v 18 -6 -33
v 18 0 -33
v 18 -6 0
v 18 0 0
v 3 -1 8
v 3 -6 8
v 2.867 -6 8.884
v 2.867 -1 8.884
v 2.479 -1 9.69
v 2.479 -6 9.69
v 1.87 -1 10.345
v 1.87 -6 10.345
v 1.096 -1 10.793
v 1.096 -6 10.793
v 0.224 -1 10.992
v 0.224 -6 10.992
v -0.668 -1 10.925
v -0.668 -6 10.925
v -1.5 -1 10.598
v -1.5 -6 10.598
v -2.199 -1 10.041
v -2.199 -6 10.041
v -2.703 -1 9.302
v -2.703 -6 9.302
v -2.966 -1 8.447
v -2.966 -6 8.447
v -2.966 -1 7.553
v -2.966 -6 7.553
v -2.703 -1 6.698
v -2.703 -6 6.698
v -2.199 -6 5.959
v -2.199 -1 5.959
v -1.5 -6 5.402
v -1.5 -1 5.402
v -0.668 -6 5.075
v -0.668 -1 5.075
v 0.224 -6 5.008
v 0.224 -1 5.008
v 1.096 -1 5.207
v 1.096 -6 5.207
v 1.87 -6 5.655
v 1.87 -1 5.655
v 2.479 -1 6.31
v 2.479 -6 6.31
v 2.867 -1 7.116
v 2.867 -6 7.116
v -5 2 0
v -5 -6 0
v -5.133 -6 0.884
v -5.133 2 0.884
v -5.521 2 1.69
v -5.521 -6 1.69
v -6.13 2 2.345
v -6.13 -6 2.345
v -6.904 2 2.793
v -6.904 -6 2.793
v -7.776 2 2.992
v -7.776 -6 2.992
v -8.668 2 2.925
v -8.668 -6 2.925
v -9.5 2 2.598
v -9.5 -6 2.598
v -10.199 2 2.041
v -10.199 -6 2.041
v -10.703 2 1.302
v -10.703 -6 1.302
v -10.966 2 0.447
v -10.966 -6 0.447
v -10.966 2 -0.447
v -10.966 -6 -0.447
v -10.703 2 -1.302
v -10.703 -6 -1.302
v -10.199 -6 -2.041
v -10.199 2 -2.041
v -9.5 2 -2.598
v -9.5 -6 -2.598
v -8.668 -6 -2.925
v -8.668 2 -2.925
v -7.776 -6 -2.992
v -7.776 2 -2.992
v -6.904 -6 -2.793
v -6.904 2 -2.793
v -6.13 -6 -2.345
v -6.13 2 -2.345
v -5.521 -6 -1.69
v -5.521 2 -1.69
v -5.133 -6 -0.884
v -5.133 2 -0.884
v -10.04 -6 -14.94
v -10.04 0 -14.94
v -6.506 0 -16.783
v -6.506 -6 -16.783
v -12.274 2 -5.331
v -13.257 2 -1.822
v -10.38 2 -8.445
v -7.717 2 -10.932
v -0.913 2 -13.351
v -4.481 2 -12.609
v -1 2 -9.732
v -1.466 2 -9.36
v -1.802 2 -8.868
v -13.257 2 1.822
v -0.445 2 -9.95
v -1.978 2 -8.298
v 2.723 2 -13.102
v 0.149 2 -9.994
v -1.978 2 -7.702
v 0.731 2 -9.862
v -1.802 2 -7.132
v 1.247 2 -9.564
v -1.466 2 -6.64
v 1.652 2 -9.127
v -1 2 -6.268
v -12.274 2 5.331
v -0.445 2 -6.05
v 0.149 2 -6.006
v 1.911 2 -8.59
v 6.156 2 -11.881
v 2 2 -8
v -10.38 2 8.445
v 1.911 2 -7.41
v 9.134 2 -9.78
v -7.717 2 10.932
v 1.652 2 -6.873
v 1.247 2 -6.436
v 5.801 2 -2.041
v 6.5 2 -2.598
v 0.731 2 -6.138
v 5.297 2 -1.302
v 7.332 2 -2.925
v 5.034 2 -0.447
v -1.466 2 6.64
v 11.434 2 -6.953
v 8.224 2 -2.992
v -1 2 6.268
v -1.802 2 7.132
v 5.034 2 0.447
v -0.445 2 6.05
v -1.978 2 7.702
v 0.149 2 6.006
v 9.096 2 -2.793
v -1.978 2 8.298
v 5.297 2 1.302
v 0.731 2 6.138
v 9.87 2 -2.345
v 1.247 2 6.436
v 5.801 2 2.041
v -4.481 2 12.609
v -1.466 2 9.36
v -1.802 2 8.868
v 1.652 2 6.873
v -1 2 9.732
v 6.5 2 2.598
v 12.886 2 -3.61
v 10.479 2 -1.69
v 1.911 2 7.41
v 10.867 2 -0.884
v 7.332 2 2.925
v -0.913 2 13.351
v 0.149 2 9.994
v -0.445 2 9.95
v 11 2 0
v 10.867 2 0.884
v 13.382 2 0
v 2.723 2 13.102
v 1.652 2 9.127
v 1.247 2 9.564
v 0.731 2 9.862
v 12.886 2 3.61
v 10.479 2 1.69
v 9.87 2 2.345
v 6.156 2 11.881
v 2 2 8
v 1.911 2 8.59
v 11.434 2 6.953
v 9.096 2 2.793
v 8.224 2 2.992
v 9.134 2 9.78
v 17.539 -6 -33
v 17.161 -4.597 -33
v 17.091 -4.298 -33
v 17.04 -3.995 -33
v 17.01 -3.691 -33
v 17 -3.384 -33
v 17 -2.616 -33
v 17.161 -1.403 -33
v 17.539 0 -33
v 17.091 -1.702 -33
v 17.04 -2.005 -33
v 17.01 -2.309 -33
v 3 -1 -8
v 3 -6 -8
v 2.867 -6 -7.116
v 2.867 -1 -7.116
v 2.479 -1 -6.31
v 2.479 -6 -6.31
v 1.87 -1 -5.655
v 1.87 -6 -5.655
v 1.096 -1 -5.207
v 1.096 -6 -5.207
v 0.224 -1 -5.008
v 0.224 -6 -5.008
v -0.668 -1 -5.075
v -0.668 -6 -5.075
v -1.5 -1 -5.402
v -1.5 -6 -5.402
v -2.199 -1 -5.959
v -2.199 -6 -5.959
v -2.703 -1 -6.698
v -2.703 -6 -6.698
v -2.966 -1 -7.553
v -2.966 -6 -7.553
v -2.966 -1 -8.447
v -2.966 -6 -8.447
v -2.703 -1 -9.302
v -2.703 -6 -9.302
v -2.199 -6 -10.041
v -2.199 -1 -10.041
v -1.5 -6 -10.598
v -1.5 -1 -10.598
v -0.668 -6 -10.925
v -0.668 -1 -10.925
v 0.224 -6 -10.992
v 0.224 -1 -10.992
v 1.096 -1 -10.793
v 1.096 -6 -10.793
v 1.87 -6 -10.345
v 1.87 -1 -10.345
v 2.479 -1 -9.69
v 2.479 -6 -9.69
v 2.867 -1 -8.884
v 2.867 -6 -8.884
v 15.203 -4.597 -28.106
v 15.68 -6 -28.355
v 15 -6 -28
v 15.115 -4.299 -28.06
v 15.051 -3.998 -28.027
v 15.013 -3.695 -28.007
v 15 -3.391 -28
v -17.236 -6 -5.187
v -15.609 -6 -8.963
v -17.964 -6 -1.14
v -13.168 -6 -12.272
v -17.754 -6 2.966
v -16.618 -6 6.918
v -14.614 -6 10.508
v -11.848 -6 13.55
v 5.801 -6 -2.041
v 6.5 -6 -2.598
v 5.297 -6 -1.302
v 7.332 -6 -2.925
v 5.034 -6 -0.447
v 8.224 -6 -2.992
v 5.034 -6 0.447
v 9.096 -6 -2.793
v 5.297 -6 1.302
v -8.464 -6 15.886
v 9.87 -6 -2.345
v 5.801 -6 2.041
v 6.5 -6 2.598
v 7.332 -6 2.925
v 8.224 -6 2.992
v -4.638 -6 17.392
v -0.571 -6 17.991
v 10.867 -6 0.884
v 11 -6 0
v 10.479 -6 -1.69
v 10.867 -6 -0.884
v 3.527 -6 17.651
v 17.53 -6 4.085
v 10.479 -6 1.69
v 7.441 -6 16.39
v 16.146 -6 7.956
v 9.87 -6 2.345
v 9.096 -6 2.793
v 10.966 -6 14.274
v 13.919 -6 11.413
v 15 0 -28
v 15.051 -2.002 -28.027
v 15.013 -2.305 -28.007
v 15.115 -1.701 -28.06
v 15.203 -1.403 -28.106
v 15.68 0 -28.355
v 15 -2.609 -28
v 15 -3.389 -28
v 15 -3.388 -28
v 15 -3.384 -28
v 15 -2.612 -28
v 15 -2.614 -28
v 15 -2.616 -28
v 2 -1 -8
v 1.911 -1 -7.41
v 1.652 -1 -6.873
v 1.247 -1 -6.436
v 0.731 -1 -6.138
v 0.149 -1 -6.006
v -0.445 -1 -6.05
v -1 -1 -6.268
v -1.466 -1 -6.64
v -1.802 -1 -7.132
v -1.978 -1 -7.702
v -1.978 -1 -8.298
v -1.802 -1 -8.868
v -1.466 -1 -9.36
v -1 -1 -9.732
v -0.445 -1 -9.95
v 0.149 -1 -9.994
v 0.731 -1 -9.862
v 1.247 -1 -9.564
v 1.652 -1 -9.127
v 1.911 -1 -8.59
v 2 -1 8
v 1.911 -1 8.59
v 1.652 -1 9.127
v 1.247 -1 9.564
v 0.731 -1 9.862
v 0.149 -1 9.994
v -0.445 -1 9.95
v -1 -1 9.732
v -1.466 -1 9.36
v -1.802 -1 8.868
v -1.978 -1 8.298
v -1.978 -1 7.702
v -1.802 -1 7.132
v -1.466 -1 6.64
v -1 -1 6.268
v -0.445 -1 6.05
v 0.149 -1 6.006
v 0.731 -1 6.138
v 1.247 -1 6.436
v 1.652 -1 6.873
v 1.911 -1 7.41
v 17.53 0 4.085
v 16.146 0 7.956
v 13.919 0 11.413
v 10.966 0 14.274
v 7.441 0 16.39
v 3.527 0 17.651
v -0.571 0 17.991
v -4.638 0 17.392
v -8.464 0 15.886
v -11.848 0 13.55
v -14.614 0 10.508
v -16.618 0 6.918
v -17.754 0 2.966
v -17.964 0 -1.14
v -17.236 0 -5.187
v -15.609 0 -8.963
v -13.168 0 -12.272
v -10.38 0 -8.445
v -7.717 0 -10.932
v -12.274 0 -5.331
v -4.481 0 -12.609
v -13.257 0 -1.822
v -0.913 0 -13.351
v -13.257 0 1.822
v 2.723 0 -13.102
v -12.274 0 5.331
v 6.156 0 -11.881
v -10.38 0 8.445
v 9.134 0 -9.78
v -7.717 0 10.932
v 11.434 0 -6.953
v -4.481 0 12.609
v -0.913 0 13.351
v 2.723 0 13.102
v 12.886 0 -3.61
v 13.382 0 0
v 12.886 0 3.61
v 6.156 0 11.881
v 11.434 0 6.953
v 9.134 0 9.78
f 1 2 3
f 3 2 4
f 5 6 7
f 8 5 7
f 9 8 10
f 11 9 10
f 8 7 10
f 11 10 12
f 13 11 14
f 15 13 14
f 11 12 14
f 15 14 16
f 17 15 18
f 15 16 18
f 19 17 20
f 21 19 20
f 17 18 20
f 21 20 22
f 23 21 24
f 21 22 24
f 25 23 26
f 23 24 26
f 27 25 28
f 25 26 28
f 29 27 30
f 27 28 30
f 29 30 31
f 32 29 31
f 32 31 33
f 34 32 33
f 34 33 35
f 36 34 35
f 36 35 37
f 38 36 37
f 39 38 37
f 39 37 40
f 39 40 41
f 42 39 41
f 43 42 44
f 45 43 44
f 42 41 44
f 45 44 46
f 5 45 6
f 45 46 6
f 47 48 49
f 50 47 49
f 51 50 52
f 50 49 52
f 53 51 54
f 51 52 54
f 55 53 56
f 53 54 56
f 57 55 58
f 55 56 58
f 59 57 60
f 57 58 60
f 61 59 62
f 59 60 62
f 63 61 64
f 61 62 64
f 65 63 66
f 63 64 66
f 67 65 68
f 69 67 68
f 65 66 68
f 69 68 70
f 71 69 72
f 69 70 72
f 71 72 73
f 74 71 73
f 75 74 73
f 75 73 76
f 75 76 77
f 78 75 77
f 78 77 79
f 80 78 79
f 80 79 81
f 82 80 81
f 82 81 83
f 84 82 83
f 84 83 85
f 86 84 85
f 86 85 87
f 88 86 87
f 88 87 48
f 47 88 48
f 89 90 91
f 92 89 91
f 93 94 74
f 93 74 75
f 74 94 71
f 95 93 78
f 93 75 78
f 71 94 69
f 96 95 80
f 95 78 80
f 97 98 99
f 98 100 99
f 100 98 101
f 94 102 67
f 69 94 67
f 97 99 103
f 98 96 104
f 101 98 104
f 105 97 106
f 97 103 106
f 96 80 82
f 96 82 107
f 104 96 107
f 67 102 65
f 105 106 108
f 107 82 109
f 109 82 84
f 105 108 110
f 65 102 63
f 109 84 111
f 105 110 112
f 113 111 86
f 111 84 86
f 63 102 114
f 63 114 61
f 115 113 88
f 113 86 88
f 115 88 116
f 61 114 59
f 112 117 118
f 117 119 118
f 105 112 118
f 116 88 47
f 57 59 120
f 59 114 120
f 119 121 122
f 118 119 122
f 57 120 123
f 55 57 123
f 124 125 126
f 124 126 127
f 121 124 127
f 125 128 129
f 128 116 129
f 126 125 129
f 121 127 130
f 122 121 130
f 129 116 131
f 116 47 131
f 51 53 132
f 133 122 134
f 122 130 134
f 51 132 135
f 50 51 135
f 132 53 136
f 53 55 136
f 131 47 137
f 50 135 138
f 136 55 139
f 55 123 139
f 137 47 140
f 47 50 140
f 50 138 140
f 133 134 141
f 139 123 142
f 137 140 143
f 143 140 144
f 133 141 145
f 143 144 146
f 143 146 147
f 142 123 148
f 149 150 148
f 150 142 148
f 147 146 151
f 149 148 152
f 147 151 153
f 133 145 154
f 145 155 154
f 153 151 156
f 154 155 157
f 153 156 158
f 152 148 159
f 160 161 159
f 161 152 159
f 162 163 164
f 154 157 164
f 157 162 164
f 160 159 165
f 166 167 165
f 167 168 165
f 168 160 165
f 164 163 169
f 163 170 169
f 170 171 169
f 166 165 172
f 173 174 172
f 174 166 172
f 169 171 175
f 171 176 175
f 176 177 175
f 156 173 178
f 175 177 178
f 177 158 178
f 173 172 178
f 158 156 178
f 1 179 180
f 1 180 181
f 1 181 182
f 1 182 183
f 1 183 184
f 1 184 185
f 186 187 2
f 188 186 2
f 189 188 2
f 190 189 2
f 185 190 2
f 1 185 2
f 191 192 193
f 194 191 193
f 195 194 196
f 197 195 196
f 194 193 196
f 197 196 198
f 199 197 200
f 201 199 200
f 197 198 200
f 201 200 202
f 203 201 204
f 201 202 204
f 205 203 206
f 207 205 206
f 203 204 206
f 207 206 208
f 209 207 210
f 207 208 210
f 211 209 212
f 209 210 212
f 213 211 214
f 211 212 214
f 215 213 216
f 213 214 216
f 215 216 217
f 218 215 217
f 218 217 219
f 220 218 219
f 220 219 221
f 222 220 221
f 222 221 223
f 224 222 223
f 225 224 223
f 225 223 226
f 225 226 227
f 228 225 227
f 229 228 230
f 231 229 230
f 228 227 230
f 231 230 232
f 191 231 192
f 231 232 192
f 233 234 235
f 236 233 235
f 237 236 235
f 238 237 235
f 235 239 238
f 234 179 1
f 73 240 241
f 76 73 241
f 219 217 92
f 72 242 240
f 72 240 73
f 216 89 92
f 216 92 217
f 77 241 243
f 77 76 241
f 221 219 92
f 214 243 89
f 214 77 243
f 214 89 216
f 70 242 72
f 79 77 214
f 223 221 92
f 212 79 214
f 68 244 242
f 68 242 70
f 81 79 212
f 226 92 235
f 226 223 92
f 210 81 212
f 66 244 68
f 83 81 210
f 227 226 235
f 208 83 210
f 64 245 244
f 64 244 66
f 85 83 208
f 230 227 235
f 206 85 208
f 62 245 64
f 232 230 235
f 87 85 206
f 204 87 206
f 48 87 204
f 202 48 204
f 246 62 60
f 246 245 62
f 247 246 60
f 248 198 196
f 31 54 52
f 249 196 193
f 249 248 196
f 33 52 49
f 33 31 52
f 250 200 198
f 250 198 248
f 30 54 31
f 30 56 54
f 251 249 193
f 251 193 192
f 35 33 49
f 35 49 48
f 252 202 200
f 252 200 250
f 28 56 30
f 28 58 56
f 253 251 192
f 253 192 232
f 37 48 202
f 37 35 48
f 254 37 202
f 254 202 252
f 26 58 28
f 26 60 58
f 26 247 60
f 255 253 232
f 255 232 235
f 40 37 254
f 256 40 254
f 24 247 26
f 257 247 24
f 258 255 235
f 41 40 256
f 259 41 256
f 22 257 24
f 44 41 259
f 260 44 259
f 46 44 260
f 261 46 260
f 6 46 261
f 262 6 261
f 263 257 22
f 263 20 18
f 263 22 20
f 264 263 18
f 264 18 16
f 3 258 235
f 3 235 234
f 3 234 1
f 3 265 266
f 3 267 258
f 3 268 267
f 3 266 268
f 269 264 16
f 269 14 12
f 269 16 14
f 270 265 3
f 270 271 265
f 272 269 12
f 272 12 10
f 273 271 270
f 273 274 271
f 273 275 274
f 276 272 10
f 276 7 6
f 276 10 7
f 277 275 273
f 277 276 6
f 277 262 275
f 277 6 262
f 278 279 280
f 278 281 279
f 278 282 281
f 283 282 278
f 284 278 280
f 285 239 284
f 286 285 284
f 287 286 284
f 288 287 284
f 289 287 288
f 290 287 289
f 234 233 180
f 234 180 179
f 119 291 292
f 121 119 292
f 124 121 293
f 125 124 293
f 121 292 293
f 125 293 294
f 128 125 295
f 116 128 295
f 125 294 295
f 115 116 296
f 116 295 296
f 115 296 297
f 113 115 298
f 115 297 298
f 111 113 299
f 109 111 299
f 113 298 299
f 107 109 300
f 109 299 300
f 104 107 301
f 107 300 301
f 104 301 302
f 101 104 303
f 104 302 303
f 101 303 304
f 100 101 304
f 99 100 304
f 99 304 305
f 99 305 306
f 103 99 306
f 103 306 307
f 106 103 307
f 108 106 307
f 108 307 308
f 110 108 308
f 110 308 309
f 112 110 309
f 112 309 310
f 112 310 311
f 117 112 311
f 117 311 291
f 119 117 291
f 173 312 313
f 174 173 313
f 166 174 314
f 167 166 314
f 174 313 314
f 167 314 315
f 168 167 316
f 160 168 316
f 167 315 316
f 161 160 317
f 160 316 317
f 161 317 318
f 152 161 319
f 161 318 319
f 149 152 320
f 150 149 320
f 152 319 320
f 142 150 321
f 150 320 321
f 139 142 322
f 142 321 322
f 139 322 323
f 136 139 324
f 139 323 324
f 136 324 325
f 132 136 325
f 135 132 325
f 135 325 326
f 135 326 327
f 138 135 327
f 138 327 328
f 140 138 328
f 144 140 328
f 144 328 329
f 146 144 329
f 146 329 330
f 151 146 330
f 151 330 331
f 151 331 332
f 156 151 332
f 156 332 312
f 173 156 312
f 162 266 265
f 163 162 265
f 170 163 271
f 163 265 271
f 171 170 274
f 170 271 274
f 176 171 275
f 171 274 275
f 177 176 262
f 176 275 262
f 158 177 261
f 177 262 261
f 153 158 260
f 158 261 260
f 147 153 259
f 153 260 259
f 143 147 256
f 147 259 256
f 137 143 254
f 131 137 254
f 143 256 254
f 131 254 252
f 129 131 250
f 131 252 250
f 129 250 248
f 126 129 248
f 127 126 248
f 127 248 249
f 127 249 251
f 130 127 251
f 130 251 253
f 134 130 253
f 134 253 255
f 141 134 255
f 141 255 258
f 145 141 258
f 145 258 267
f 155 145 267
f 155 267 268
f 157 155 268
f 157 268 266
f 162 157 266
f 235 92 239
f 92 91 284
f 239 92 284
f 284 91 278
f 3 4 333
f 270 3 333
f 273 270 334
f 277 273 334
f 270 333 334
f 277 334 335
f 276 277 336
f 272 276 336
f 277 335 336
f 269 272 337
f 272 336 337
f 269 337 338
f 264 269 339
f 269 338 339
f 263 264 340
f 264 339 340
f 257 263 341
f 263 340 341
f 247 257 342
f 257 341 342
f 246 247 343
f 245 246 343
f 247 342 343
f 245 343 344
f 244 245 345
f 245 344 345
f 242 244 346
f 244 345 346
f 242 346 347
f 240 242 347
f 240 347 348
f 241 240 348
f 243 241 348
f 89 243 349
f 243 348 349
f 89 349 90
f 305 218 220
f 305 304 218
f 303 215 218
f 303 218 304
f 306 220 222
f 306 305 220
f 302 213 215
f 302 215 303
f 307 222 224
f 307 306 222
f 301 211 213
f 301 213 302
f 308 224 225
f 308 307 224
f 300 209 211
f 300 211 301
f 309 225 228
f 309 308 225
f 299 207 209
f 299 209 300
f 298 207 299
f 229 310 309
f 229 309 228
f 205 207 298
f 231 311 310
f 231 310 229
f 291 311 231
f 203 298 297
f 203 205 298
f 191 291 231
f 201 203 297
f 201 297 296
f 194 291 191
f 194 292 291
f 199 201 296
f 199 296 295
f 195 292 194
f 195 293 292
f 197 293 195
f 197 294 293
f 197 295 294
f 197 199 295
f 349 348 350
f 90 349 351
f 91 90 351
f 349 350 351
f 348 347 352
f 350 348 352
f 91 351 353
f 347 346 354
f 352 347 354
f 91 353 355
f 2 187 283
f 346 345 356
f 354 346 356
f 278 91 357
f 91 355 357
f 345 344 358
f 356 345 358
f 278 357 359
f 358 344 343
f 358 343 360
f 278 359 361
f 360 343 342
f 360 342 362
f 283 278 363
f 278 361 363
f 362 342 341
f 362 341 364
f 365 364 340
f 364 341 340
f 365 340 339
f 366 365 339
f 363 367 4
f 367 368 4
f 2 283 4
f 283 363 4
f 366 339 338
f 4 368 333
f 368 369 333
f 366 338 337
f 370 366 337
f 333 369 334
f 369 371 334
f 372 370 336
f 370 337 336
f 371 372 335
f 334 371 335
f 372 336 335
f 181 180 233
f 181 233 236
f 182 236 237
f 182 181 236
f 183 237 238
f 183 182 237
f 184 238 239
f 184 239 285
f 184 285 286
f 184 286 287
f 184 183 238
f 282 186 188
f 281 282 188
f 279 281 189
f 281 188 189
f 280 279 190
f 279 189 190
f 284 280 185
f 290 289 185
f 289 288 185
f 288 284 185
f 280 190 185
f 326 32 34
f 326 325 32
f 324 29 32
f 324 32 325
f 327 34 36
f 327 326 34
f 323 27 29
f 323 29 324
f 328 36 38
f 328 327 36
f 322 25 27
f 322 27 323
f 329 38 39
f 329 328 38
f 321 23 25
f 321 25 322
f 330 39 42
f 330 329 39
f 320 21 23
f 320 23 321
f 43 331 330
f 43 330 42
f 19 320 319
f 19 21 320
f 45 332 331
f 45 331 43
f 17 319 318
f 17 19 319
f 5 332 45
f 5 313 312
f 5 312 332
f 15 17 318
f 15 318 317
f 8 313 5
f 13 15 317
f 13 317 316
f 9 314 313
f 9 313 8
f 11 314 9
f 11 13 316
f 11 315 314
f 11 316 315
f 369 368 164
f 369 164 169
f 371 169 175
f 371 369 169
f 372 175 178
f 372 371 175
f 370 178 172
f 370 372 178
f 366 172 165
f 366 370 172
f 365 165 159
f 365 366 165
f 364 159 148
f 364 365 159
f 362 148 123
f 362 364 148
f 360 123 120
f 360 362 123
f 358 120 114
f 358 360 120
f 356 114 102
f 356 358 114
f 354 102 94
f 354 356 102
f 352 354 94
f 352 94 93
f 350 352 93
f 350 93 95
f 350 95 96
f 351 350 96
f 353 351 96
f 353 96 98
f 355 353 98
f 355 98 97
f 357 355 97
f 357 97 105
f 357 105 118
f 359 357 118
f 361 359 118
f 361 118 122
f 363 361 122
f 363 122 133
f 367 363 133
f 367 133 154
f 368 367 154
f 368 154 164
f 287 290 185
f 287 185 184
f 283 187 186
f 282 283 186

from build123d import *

# Parameters (mm, degrees)
F1_DEPTH    = 6
F2_SIZE2    = 4.99999
F2_SIZE     = 1.99999
F3_T4_DEPTH = 15.7736618076
F3_T9_DEPTH = 15.7736618076
F4_T4_DEPTH = 8.4627924491
F4_T9_DEPTH = 8.4627924491
F5_R        = 13.3817573781
F5_R_2      = 3
F5_R_3      = 2
F6_DEPTH    = 8
F7_DEPTH    = 8.001
F8_DEPTH    = 5


# Not quite as in the source:
# - a fillet or chamfer that OpenCascade refuses, or shapes differently, is made with other operations: its cross-section is extruded or revolved along the edge and cut away or added
# - a fillet or chamfer is up to 0.001 mm smaller than in the source, because OpenCascade refuses the exact size


with BuildPart() as f1:
    # F0 (on Front) → F1 (new body)
    with BuildSketch(Plane.XZ):
        with BuildLine():
            ThreePointArc((-6.5061441265, -16.7830297803), (10.1707769055, -14.8511042397), (18, 0))
            ThreePointArc((18, 0), (-8.4642142433, 15.8857507611), (-10.0396752493, -14.9400442064))
            Line((-10.0396752493, -14.9400442064), (-6.5061441265, -16.7830297803))
        make_face()
        with BuildLine():
            Line((18, -33), (18, 0))
            ThreePointArc((18, 0), (10.1707769055, -14.8511042397), (-6.5061441265, -16.7830297803))
            Line((-6.5061441265, -16.7830297803), (15, -28))
            Line((15, -28), (15, -33))
            Line((15, -33), (18, -33))
        make_face()
    extrude(amount=F1_DEPTH)

    # F2 (size 2 and 5 in the source; OpenCascade refuses exactly that, so slightly less here)
    f2_edges = [f1.edges().sort_by_distance(p)[0] for p in [
        (15, -3, -33),
    ]]
    f2_side = f1.faces().sort_by_distance((16.5, -3, -33))[0]
    chamfer(f2_edges, length=F2_SIZE, length2=F2_SIZE2, reference=f2_side)

    # F3: chamfer of 0.5 x 2 on 2 edges, made by hand


with BuildPart() as f3_tool2:
    # F3_s3 → F3_t4 (new body)
    with BuildSketch(Plane(origin=(15.653192591, 0, -39.1330988771), x_dir=(0, 1, 0), z_dir=(-0.3713897159, 0, 0.9284770751))):
        Polygon((0, -4.0282403683), (-2, -3.5282403683), (0, -3.5282403683), align=None)
    extrude(amount=F3_T4_DEPTH)

    split(bisect_by=Plane(origin=(-8.2729096879, 0, -15.8615369933), x_dir=(0, 1, 0), z_dir=(-0.4624484745, 0, -0.8866461574)), keep=Keep.TOP)


with BuildPart() as f1_1:
    add(f1.part)

    # F3_t1: cut F3_tool2
    add(f3_tool2.part, mode=Mode.SUBTRACT)


with BuildPart() as f3_tool7:
    # F3_s8 → F3_t9 (new body)
    with BuildSketch(Plane(origin=(15.653192591, 0, -39.1330988771), x_dir=(0, 1, 0), z_dir=(-0.3713897159, 0, 0.9284770751))):
        Polygon((-4, -3.5282403683), (-6, -4.0282403683), (-6, -3.5282403683), align=None)
    extrude(amount=F3_T9_DEPTH)

    split(bisect_by=Plane(origin=(-8.2729096879, 0, -15.8615369933), x_dir=(0, 1, 0), z_dir=(-0.4624484745, 0, -0.8866461574)), keep=Keep.TOP)


with BuildPart() as f1_2:
    add(f1_1.part)

    # F3_t6: cut F3_tool7
    add(f3_tool7.part, mode=Mode.SUBTRACT)

    # F4: fillet of radius 5 on 2 edges, made by hand


with BuildPart() as f4_tool2:
    # F4_s3 → F4_t4 (new body)
    with BuildSketch(Plane(origin=(14.2956017442, 0, -35.739111578), x_dir=(0, 1, 0), z_dir=(-0.3713897159, 0, 0.9284770751))):
        with BuildLine():
            ThreePointArc((-1.4028500029, -3.6775278676), (-2.0046118096, -3.5657025849), (-2.615528128, -3.5282403683))
            Line((-2.615528128, -3.5282403683), (-2, -3.5282403683))
            Line((-2, -3.5282403683), (-1.4028500029, -3.6775278676))
        make_face()
    extrude(amount=F4_T4_DEPTH)

    split(bisect_by=Plane(origin=(-8.2729096879, 0, -15.8615369933), x_dir=(0, 1, 0), z_dir=(-0.4624484745, 0, -0.8866461574)), keep=Keep.TOP)


with BuildPart() as f1_3:
    add(f1_2.part)

    # F4_t1: cut F4_tool2
    add(f4_tool2.part, mode=Mode.SUBTRACT)


with BuildPart() as f4_tool7:
    # F4_s8 → F4_t9 (new body)
    with BuildSketch(Plane(origin=(14.2956017442, 0, -35.739111578), x_dir=(0, 1, 0), z_dir=(-0.3713897159, 0, 0.9284770751))):
        with BuildLine():
            ThreePointArc((-4.5971499971, -3.6775278676), (-3.9953881904, -3.5657025849), (-3.384471872, -3.5282403683))
            Line((-3.384471872, -3.5282403683), (-4, -3.5282403683))
            Line((-4, -3.5282403683), (-4.5971499971, -3.6775278676))
        make_face()
    extrude(amount=F4_T9_DEPTH)

    split(bisect_by=Plane(origin=(-8.2729096879, 0, -15.8615369933), x_dir=(0, 1, 0), z_dir=(-0.4624484745, 0, -0.8866461574)), keep=Keep.TOP)


with BuildPart() as f1_4:
    add(f1_3.part)

    # F4_t6: cut F4_tool7
    add(f4_tool7.part, mode=Mode.SUBTRACT)

    # F5 (on face) → F6 (join)
    with BuildSketch(Plane.XZ.offset(6)):
        Circle(F5_R)
        with Locations((0, -8)):
            Circle(F5_R_2, mode=Mode.SUBTRACT)
        with Locations((-8, 0)):
            Circle(F5_R_2, mode=Mode.SUBTRACT)
        with Locations((8, 0)):
            Circle(F5_R_2, mode=Mode.SUBTRACT)
        with Locations((0, 8)):
            Circle(F5_R_2, mode=Mode.SUBTRACT)
        with Locations((0, 8)):
            Circle(F5_R_2)
        with Locations((0, 8)):
            Circle(F5_R_3, mode=Mode.SUBTRACT)
        with Locations((0, -8)):
            Circle(F5_R_2)
        with Locations((0, -8)):
            Circle(F5_R_3, mode=Mode.SUBTRACT)
        with Locations((-8, 0)):
            Circle(F5_R_2)
        with Locations((8, 0)):
            Circle(F5_R_2)
        with Locations((0, 8)):
            Circle(F5_R_3)
        with Locations((0, -8)):
            Circle(F5_R_3)
    extrude(amount=-F6_DEPTH)

    # F5 (on face) → F7 (cut, through all)
    with BuildSketch(Plane.XZ.offset(6)):
        with Locations((-8, 0)):
            Circle(F5_R_2)
        with Locations((0, 8)):
            Circle(F5_R_3)
        with Locations((8, 0)):
            Circle(F5_R_2)
        with Locations((0, -8)):
            Circle(F5_R_3)
    extrude(amount=-F7_DEPTH, mode=Mode.SUBTRACT)

    # F5 (on face) → F8 (cut)
    with BuildSketch(Plane.XZ.offset(6)):
        with Locations((0, 8)):
            Circle(F5_R_2)
        with Locations((0, 8)):
            Circle(F5_R_3, mode=Mode.SUBTRACT)
        with Locations((0, -8)):
            Circle(F5_R_2)
        with Locations((0, -8)):
            Circle(F5_R_3, mode=Mode.SUBTRACT)
    extrude(amount=-F8_DEPTH, mode=Mode.SUBTRACT)


solid = f1_4.part
